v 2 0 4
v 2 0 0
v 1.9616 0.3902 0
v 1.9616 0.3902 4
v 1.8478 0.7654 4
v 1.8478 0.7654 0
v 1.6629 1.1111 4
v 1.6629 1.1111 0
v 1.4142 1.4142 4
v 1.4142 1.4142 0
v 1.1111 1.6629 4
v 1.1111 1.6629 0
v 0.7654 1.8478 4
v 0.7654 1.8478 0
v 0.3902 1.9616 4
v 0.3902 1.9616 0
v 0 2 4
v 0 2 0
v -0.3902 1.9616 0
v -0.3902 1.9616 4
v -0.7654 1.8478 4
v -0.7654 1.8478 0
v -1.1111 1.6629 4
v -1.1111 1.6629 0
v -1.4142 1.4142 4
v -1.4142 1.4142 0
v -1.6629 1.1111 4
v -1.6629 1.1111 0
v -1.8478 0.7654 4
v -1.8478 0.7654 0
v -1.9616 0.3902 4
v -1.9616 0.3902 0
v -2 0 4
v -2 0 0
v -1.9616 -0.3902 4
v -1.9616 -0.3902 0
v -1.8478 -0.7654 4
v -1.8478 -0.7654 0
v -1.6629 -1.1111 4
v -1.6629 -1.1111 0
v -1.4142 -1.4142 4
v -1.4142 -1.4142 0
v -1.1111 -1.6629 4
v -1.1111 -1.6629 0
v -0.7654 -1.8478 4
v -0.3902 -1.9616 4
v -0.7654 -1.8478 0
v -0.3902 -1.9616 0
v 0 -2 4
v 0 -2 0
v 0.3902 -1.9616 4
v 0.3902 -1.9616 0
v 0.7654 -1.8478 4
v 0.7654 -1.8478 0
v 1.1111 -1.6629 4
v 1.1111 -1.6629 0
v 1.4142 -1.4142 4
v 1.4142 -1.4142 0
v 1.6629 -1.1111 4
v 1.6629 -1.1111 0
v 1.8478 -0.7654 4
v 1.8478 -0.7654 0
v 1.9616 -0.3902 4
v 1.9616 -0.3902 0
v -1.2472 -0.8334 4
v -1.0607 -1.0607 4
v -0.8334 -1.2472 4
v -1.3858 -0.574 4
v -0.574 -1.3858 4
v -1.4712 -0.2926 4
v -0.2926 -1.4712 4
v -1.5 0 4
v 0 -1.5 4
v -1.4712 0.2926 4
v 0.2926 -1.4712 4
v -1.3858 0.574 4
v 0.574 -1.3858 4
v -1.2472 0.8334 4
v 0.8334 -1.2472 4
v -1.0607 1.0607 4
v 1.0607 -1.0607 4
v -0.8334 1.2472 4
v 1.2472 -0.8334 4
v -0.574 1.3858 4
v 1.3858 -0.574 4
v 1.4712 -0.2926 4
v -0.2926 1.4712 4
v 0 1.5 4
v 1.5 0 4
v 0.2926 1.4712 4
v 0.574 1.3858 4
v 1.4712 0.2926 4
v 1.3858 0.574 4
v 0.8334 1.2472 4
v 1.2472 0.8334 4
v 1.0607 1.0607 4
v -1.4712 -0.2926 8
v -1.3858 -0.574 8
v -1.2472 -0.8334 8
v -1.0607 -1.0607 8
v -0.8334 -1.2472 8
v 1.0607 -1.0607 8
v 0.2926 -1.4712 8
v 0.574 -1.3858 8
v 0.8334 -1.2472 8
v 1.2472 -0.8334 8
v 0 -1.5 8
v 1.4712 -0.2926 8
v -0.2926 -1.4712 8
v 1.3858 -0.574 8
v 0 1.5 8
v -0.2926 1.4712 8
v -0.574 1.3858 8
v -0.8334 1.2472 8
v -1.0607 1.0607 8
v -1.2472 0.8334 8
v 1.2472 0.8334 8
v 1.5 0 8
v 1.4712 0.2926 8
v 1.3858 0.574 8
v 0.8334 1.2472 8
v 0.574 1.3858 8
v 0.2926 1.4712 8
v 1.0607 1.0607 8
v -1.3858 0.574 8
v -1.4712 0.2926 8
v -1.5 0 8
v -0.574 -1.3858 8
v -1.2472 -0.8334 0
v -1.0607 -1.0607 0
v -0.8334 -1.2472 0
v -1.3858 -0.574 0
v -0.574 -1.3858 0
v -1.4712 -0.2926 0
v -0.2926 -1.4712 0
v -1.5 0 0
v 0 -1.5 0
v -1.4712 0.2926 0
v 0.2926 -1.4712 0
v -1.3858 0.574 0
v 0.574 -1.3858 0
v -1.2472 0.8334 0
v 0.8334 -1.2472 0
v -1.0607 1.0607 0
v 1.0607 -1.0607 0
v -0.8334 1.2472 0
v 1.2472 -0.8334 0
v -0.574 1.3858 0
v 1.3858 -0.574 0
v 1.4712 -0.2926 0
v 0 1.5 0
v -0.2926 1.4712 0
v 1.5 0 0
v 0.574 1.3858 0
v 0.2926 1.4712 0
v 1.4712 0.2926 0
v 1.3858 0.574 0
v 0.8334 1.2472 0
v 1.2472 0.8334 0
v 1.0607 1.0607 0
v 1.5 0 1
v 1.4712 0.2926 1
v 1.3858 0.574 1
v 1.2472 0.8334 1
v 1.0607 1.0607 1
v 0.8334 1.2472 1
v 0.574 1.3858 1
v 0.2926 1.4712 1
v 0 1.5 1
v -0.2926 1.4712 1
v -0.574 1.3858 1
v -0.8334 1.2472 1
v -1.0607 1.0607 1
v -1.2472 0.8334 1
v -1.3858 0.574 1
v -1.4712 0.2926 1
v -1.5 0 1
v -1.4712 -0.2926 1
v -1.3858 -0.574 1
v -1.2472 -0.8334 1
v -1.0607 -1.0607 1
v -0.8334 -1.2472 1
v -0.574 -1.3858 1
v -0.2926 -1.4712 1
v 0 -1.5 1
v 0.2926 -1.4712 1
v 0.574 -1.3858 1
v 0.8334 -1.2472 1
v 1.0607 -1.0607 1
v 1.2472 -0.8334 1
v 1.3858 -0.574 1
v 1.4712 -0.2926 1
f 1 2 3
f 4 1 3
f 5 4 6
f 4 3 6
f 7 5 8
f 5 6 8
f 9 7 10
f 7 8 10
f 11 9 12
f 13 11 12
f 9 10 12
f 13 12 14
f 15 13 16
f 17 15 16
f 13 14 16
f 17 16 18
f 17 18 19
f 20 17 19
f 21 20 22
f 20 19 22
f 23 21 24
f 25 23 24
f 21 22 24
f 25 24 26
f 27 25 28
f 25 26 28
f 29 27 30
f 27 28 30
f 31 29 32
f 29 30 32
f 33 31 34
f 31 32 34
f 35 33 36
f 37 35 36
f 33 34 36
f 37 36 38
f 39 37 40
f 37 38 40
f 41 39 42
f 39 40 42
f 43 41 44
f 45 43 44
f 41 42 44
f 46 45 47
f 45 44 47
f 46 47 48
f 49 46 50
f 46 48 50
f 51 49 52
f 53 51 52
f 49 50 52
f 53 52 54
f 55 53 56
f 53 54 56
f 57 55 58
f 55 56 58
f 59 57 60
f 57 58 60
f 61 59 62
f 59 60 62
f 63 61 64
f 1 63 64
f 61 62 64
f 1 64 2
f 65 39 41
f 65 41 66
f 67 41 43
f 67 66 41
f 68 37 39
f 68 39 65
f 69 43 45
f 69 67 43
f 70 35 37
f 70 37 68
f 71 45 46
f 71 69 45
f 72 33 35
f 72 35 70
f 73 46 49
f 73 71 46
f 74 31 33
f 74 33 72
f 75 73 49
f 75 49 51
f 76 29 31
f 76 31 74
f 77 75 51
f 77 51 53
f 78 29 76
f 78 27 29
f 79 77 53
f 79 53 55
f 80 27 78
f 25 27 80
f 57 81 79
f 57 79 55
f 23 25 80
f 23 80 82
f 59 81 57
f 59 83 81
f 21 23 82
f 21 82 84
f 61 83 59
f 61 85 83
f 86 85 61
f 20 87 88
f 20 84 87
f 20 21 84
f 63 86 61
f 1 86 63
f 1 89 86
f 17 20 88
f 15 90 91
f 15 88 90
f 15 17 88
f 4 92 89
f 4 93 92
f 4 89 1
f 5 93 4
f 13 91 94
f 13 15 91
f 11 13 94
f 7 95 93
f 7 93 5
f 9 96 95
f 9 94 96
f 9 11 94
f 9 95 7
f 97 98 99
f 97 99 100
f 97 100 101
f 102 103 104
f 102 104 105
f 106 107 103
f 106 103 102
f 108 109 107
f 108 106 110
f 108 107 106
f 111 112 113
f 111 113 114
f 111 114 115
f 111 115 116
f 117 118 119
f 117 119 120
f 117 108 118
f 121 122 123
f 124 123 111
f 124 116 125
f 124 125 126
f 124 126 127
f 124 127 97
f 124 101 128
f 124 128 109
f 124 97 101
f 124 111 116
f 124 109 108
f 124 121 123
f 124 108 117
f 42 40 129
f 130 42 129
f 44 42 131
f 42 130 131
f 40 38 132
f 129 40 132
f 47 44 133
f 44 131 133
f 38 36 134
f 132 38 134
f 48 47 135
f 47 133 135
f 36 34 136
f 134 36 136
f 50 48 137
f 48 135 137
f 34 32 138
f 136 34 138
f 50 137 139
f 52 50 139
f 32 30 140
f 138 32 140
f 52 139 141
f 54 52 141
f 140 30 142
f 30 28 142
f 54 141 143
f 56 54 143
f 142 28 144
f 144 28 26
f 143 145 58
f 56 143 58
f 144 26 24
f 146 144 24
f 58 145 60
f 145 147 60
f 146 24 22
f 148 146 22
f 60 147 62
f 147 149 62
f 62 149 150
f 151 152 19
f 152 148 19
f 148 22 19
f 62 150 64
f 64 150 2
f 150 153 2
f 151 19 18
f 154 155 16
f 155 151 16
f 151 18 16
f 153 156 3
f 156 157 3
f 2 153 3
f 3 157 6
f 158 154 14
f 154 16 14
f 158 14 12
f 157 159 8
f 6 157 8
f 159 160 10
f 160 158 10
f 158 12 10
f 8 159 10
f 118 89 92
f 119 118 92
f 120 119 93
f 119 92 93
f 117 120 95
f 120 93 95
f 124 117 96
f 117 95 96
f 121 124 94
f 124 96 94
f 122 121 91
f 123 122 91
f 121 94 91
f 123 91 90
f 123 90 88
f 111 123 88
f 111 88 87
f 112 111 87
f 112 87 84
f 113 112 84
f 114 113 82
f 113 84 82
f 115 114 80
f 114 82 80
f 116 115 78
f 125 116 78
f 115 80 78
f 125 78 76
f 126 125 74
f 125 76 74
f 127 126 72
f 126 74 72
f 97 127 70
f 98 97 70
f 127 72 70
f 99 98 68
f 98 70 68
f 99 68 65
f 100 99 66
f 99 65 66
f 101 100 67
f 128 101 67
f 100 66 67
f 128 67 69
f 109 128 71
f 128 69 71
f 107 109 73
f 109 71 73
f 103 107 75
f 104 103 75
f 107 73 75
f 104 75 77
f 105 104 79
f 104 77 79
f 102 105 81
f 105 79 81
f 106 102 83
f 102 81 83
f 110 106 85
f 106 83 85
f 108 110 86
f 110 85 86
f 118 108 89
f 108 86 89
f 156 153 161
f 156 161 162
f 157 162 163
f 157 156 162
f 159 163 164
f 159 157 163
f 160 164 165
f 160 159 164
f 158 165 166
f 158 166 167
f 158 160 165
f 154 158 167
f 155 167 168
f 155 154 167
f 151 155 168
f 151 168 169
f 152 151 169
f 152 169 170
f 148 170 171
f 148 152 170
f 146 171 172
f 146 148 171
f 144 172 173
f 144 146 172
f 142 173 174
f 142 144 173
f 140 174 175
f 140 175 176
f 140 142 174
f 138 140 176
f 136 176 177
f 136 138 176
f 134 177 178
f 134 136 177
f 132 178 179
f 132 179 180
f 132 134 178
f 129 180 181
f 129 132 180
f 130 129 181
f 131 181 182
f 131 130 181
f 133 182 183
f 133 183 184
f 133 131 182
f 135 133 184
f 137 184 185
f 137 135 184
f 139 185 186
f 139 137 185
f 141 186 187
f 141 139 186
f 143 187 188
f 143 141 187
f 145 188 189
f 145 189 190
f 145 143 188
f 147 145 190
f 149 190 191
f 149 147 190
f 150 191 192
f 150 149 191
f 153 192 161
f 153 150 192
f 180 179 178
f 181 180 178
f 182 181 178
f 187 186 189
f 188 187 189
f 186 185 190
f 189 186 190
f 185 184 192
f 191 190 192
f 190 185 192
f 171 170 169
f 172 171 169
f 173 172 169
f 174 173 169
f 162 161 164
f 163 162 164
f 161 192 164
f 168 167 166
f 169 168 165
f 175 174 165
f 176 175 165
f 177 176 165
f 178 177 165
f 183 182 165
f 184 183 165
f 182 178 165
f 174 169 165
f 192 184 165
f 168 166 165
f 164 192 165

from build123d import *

# Parameters (mm, degrees)
CYLINDER002_R     = 1.5
CYLINDER002_DEPTH = 1
CYLINDER_R        = 2
CYLINDER_DEPTH    = 4
CYLINDER001_R     = 1.5
CYLINDER001_DEPTH = 4


with BuildPart() as cylinder002:
    # Cylinder002 → Cylinder002 (new body)
    with BuildSketch(Plane.XY):
        Circle(CYLINDER002_R)
    extrude(amount=CYLINDER002_DEPTH)


with BuildPart() as cut:
    # Cylinder → Cylinder (new body)
    with BuildSketch(Plane.XY):
        Circle(CYLINDER_R)
    extrude(amount=CYLINDER_DEPTH)

    # Cut: cut Cylinder002
    add(cylinder002.part, mode=Mode.SUBTRACT)


with BuildPart() as fusion:
    # Cylinder001 → Cylinder001 (new body)
    with BuildSketch(Plane.XY.offset(4)):
        Circle(CYLINDER001_R)
    extrude(amount=CYLINDER001_DEPTH)

    # Fusion: union Cut
    add(cut.part)


solid = fusion.part
